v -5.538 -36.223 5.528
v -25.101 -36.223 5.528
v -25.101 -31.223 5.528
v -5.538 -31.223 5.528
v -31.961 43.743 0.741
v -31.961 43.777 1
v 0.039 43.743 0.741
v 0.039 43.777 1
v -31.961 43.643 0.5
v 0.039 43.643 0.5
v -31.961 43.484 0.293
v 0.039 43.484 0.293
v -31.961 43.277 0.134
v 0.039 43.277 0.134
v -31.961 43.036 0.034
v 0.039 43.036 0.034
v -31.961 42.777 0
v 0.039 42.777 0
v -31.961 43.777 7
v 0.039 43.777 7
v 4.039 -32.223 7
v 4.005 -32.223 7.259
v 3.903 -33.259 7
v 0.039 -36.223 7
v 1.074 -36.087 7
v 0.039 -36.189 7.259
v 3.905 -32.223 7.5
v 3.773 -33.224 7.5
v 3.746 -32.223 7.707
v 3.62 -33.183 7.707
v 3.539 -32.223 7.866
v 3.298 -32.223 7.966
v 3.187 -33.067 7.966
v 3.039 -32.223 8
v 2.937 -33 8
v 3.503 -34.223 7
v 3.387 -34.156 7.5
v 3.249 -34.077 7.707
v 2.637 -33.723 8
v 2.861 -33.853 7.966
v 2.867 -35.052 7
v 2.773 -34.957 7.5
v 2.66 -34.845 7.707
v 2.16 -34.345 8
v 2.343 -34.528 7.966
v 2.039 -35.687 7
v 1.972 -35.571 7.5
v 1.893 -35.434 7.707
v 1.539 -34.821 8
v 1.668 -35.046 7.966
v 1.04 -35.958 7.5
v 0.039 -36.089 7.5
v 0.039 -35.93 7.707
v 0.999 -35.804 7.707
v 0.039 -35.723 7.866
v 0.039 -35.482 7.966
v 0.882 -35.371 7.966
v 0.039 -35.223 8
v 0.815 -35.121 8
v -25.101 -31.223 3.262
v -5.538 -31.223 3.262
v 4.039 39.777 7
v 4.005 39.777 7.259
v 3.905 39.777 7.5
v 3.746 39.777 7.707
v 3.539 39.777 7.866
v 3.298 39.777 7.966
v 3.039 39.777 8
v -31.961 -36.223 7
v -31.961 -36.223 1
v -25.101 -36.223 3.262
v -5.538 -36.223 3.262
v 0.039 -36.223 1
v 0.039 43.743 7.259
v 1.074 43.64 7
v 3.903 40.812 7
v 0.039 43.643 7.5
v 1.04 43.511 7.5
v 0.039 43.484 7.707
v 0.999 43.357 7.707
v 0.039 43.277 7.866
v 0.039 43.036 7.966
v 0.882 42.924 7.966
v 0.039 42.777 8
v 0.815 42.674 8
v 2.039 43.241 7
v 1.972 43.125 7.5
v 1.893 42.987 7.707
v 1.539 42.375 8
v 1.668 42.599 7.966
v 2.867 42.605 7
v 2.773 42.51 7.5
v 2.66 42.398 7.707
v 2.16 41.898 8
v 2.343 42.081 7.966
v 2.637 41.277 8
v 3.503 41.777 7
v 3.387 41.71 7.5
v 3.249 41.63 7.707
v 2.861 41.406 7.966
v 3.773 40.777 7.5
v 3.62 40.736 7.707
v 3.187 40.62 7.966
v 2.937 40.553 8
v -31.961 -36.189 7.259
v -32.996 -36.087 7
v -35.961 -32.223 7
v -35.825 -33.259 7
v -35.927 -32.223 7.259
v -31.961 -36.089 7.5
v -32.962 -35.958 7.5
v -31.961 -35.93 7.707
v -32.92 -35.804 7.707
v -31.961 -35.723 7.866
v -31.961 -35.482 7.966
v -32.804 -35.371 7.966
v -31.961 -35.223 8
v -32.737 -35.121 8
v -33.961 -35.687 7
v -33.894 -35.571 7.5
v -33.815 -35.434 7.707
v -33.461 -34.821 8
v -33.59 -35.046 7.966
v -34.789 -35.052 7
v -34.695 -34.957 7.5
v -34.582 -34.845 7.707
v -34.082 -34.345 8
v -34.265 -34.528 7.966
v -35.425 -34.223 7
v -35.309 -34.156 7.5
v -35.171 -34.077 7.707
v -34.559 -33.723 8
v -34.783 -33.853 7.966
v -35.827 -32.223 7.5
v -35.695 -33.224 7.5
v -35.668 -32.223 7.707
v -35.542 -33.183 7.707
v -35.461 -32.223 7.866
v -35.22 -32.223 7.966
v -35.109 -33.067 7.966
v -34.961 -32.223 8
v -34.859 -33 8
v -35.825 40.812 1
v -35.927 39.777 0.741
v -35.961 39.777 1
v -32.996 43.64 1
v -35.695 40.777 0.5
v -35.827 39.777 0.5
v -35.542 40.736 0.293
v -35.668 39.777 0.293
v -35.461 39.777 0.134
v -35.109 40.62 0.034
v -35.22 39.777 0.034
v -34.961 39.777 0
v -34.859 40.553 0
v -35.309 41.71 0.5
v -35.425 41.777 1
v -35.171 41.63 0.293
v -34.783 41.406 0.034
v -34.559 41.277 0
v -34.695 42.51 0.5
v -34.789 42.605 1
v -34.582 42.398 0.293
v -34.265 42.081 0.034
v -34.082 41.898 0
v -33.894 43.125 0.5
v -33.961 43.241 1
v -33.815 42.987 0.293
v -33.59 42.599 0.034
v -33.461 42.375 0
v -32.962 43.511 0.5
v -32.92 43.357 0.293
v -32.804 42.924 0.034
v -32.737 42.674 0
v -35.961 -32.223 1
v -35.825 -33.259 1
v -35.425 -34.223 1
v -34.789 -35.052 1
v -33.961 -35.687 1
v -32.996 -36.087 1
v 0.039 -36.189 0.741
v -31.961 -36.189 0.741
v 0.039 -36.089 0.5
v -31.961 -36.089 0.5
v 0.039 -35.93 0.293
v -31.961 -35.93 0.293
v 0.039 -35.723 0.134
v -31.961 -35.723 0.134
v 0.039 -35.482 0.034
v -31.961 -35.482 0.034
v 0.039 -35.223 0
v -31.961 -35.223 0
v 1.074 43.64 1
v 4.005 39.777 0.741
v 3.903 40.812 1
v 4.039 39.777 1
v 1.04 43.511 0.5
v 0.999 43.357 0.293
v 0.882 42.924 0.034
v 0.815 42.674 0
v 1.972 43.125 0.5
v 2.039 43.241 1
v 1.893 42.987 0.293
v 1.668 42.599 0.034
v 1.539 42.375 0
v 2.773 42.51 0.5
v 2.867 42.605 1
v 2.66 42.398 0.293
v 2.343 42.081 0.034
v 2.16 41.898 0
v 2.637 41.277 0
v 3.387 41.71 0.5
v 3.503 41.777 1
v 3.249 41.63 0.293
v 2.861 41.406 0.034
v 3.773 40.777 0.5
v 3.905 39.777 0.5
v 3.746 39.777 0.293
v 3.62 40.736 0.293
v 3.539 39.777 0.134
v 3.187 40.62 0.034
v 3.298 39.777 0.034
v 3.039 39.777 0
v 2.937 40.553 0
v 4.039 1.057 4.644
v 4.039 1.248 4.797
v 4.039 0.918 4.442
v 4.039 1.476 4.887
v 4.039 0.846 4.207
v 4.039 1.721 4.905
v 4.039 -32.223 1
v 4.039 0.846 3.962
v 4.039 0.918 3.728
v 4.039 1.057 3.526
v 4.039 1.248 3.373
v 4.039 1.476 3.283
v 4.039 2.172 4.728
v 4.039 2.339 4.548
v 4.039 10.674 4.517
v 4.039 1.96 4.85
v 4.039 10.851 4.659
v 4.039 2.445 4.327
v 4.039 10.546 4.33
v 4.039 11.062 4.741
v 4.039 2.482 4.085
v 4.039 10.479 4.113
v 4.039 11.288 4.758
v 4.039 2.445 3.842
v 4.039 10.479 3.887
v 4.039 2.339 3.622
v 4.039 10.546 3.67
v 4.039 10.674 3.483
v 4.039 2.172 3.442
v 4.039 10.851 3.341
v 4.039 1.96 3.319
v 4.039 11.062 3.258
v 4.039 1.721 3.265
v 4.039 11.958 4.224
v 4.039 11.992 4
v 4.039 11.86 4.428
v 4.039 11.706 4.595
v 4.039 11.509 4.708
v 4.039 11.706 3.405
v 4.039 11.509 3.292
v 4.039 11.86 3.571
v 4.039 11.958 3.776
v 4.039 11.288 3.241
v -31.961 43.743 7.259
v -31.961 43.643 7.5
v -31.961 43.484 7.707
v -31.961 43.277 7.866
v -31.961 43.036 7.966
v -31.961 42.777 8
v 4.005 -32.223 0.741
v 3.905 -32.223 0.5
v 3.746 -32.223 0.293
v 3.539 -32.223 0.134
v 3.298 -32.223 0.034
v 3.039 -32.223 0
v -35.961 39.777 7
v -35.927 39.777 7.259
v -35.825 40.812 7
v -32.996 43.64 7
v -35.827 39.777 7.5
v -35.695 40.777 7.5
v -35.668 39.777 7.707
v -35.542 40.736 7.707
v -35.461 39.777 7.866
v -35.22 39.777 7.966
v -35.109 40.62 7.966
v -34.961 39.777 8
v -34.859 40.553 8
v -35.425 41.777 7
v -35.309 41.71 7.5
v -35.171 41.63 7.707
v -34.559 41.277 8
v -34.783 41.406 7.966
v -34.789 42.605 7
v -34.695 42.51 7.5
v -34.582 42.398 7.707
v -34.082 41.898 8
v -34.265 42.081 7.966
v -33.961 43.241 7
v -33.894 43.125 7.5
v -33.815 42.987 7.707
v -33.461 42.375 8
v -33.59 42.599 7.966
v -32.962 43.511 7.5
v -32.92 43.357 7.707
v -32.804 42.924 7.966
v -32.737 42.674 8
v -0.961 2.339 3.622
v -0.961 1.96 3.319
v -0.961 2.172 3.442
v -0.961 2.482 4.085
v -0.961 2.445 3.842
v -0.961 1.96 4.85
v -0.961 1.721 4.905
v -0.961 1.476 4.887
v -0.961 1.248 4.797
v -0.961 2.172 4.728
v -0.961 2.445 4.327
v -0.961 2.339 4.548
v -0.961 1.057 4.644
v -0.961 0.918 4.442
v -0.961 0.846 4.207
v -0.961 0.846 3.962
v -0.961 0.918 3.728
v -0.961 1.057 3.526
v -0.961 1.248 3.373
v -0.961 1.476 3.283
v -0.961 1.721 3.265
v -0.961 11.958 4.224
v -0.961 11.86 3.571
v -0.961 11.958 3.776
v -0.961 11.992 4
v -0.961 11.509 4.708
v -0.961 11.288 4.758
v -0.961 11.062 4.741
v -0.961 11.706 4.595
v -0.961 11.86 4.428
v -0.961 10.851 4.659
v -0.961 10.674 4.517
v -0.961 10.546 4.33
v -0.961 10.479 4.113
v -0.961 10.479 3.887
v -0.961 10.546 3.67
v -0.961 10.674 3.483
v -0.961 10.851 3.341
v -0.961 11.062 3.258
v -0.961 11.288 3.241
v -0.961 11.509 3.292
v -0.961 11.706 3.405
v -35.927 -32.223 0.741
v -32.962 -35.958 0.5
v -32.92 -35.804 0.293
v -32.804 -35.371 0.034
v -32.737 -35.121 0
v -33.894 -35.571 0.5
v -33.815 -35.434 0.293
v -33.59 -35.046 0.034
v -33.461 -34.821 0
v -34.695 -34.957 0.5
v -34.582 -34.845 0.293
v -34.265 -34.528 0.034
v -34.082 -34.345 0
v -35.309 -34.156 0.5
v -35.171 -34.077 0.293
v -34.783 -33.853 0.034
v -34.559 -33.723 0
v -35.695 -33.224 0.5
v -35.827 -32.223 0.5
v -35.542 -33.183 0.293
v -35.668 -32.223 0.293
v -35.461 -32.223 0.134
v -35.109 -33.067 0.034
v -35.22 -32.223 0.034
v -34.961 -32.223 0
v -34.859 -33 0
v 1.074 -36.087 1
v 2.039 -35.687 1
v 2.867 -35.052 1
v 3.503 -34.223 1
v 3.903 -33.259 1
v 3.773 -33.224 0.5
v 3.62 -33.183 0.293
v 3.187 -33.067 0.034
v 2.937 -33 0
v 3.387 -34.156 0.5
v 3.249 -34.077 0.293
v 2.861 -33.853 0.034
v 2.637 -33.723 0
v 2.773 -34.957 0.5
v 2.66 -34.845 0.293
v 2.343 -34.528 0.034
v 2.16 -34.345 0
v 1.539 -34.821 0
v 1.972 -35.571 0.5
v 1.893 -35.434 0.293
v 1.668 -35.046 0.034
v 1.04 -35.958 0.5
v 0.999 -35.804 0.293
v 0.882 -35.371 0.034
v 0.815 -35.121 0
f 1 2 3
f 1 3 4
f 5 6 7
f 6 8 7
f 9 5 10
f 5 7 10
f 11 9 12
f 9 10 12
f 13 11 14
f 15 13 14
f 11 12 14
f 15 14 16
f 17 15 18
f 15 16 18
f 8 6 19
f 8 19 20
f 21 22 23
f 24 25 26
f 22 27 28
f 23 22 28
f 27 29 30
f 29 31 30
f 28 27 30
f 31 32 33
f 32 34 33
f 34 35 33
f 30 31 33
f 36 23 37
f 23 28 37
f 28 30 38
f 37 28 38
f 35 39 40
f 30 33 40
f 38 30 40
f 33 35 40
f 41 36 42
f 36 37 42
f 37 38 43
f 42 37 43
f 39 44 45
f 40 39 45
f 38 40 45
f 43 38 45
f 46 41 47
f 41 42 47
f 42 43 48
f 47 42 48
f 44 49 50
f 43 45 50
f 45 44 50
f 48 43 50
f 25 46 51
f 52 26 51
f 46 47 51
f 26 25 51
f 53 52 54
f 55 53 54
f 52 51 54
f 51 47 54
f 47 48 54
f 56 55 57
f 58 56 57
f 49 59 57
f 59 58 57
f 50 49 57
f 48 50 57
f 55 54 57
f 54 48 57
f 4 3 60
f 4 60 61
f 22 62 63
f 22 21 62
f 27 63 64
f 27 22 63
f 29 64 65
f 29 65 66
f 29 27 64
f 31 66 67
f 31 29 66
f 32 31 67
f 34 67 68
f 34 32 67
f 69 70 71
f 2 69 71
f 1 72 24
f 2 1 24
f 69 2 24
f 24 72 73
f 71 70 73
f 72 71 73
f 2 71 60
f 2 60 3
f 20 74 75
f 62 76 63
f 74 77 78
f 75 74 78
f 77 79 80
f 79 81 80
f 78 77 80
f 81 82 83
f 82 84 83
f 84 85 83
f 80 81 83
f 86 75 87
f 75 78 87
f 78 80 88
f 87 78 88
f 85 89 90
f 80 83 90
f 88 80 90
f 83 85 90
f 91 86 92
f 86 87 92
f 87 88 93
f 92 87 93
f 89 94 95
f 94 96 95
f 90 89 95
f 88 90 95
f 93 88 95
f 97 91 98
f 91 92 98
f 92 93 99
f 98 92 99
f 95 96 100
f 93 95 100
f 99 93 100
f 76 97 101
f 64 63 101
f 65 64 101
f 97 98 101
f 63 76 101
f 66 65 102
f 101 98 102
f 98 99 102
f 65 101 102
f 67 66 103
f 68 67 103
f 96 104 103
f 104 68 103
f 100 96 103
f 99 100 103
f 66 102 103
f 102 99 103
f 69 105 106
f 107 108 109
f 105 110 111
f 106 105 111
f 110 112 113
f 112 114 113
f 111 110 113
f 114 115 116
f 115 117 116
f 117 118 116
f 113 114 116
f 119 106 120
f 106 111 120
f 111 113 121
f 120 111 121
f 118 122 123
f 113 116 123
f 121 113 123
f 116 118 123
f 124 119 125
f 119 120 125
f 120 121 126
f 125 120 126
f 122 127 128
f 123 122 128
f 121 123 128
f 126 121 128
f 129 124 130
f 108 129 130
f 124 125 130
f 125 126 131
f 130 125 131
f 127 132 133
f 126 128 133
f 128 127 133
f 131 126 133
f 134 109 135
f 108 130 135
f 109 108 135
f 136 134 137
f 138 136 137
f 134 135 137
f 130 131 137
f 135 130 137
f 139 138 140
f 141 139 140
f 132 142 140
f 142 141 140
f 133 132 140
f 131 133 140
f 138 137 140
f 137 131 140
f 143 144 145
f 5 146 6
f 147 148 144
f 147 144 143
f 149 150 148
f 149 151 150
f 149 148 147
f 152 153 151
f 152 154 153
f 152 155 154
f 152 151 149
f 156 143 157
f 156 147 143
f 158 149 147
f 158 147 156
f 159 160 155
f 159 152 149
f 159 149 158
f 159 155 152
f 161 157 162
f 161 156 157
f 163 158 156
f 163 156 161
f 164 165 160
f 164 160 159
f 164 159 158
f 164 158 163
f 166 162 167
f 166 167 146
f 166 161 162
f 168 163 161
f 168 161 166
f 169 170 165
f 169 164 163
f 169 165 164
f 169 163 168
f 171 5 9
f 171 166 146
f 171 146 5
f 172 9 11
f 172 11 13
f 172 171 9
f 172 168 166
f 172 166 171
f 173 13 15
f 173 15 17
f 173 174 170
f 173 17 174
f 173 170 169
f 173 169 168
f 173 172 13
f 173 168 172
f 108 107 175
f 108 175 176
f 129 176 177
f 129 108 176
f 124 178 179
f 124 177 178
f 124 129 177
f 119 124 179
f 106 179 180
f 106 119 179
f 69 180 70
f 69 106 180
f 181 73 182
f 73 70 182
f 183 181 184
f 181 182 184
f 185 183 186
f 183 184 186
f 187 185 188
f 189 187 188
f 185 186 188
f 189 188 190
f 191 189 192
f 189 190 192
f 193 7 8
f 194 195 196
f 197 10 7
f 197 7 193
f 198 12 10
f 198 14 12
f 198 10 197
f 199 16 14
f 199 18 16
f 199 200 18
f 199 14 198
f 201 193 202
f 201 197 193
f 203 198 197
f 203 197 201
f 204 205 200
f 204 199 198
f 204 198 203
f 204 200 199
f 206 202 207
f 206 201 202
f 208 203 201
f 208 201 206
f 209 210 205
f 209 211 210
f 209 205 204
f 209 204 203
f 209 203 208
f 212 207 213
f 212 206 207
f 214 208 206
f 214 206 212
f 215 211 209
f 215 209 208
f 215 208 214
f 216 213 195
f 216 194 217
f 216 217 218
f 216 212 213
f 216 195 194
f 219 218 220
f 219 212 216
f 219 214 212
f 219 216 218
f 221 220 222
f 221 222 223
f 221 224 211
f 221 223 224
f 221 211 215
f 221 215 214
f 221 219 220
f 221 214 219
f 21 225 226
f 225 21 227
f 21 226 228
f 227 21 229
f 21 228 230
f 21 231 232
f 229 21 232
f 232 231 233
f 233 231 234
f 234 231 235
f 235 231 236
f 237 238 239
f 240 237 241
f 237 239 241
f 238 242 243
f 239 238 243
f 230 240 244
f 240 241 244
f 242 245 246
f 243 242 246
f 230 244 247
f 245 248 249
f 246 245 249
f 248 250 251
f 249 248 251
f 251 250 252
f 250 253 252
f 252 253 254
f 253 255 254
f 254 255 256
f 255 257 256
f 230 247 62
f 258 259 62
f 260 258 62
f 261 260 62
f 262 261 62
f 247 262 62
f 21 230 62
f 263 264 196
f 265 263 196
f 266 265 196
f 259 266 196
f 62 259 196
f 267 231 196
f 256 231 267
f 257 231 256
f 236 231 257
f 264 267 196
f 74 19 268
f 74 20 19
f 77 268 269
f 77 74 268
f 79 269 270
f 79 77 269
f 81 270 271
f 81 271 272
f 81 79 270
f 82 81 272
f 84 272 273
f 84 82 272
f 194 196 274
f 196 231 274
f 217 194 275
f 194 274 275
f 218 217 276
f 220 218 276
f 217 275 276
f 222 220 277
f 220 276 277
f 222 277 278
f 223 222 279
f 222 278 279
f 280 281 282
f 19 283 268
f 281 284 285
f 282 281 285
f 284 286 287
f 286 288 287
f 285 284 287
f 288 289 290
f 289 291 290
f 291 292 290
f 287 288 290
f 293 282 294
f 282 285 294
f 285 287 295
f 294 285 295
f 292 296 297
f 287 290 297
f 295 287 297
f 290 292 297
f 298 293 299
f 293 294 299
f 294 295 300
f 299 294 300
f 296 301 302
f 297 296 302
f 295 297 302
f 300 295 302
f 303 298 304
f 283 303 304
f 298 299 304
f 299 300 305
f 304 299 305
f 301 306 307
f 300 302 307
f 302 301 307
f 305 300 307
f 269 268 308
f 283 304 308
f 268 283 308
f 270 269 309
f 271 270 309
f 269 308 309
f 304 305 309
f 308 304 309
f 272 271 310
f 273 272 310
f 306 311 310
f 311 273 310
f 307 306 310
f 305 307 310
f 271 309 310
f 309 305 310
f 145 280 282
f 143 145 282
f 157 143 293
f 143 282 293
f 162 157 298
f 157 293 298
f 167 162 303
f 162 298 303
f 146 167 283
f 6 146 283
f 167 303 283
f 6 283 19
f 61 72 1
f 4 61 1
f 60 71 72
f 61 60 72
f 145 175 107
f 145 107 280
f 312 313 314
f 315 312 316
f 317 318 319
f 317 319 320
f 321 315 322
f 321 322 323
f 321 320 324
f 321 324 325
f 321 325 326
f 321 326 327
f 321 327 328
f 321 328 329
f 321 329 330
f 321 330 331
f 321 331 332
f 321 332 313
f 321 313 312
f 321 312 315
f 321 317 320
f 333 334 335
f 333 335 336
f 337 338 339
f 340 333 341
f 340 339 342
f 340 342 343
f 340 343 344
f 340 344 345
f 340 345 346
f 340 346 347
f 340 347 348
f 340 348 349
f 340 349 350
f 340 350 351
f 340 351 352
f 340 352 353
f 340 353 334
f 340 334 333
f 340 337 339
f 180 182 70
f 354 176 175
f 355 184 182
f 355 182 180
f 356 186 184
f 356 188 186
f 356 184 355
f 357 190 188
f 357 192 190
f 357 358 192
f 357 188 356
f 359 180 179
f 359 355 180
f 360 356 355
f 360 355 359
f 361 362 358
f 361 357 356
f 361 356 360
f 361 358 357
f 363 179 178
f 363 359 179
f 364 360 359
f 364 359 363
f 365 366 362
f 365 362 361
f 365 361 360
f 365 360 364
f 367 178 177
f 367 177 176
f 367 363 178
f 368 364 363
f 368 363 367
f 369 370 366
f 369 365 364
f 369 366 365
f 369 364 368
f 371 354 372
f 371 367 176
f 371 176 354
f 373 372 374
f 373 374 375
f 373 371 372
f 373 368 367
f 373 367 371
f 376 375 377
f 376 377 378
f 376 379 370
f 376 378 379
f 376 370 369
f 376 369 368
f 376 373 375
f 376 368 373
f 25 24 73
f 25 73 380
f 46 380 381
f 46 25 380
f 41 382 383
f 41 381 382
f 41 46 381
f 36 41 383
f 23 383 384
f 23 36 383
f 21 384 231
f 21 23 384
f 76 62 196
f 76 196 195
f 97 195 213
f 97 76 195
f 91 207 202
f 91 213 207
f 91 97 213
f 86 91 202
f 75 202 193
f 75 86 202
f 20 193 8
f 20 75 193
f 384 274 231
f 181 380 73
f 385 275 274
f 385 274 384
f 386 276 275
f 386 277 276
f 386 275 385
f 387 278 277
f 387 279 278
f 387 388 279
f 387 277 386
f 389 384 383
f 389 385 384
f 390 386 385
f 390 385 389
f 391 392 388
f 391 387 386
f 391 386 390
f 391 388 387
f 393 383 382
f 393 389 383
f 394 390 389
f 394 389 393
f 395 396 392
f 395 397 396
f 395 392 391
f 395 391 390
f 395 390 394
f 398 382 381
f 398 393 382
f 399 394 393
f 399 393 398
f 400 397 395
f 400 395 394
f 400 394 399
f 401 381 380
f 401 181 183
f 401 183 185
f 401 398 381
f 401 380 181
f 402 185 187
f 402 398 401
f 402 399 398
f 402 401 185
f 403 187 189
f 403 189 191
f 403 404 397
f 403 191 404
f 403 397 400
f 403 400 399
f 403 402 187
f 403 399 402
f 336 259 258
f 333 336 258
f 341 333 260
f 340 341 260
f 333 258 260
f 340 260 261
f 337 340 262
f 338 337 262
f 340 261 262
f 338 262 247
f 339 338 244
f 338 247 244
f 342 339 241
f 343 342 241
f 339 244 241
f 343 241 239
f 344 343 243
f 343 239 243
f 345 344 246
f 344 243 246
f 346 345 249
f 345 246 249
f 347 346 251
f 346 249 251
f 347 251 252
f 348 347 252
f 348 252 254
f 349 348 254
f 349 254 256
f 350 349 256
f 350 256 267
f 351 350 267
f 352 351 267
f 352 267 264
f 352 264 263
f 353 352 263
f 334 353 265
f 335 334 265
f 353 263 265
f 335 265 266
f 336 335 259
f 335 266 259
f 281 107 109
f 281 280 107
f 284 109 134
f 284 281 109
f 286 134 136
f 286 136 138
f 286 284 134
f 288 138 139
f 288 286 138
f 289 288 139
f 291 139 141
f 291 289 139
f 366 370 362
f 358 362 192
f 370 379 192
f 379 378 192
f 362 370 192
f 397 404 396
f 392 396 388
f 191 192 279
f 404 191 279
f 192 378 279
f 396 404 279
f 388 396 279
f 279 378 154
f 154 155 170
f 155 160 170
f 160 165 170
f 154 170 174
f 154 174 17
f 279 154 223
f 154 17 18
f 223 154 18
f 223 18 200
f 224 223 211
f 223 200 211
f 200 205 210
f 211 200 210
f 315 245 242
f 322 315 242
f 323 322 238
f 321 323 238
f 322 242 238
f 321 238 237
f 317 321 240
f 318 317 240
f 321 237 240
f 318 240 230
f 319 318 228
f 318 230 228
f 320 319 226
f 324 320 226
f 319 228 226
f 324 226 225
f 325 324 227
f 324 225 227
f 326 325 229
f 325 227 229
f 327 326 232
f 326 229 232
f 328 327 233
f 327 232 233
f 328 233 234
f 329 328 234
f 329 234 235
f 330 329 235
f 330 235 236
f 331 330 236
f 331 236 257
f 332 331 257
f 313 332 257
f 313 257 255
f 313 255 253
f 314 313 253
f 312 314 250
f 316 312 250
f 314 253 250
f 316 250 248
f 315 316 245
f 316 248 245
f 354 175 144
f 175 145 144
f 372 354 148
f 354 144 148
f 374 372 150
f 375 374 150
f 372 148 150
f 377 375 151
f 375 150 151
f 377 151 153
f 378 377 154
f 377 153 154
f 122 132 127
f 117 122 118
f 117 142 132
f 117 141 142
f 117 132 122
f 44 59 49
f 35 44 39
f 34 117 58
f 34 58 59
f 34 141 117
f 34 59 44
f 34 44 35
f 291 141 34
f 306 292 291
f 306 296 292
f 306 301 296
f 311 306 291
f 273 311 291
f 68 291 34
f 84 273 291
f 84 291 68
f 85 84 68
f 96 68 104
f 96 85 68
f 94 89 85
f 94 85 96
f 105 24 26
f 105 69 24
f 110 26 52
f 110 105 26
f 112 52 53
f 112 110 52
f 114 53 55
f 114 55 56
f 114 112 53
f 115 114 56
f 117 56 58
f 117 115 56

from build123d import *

# Parameters (mm, degrees)
F0_W     = 40
F0_H     = 80
F1_DEPTH = 8
F2_R     = 4
F3_R     = 1
F4_W     = 19.56314
F4_H     = 2.266603
F5_DEPTH = 5
F6_R     = 0.760622
F6_R_2   = 0.822373
F7_DEPTH = 5


with BuildPart() as f1:
    # F0 (on Top) → F1 (new body)
    with BuildSketch(Plane.XY):
        with Locations((-15.960967, 3.776696)):
            Rectangle(F0_W, F0_H)
    extrude(amount=F1_DEPTH)

    # F2
    f2_edges = [f1.edges().sort_by_distance(p)[0] for p in [
        (4.039033, 43.776696, 4),
        (4.039033, -36.223304, 4),
        (-35.960967, -36.223304, 4),
        (-35.960967, 43.776696, 4),
    ]]
    fillet(f2_edges, radius=F2_R)

    # F3
    f3_edges = [f1.edges().sort_by_distance(p)[0] for p in [
        (-35.960967, 3.776696, 8),
        (-35.960967, 3.776696, 0),
    ]]
    fillet(f3_edges, radius=F3_R)

    # F4 (on face) → F5 (cut)
    with BuildSketch(Plane.XZ.offset(36.223304)):
        with Locations((-15.319868, 4.395118)):
            Rectangle(F4_W, F4_H)
    extrude(amount=-F5_DEPTH, mode=Mode.SUBTRACT)

    # F6 (on face) → F7 (cut)
    with BuildSketch(Plane.YZ.offset(4.039033)):
        with Locations((11.231415, 3.99991)):
            Circle(F6_R)
        with Locations((1.659386, 4.084856)):
            Circle(F6_R_2)
    extrude(amount=-F7_DEPTH, mode=Mode.SUBTRACT)


solid = f1.part
